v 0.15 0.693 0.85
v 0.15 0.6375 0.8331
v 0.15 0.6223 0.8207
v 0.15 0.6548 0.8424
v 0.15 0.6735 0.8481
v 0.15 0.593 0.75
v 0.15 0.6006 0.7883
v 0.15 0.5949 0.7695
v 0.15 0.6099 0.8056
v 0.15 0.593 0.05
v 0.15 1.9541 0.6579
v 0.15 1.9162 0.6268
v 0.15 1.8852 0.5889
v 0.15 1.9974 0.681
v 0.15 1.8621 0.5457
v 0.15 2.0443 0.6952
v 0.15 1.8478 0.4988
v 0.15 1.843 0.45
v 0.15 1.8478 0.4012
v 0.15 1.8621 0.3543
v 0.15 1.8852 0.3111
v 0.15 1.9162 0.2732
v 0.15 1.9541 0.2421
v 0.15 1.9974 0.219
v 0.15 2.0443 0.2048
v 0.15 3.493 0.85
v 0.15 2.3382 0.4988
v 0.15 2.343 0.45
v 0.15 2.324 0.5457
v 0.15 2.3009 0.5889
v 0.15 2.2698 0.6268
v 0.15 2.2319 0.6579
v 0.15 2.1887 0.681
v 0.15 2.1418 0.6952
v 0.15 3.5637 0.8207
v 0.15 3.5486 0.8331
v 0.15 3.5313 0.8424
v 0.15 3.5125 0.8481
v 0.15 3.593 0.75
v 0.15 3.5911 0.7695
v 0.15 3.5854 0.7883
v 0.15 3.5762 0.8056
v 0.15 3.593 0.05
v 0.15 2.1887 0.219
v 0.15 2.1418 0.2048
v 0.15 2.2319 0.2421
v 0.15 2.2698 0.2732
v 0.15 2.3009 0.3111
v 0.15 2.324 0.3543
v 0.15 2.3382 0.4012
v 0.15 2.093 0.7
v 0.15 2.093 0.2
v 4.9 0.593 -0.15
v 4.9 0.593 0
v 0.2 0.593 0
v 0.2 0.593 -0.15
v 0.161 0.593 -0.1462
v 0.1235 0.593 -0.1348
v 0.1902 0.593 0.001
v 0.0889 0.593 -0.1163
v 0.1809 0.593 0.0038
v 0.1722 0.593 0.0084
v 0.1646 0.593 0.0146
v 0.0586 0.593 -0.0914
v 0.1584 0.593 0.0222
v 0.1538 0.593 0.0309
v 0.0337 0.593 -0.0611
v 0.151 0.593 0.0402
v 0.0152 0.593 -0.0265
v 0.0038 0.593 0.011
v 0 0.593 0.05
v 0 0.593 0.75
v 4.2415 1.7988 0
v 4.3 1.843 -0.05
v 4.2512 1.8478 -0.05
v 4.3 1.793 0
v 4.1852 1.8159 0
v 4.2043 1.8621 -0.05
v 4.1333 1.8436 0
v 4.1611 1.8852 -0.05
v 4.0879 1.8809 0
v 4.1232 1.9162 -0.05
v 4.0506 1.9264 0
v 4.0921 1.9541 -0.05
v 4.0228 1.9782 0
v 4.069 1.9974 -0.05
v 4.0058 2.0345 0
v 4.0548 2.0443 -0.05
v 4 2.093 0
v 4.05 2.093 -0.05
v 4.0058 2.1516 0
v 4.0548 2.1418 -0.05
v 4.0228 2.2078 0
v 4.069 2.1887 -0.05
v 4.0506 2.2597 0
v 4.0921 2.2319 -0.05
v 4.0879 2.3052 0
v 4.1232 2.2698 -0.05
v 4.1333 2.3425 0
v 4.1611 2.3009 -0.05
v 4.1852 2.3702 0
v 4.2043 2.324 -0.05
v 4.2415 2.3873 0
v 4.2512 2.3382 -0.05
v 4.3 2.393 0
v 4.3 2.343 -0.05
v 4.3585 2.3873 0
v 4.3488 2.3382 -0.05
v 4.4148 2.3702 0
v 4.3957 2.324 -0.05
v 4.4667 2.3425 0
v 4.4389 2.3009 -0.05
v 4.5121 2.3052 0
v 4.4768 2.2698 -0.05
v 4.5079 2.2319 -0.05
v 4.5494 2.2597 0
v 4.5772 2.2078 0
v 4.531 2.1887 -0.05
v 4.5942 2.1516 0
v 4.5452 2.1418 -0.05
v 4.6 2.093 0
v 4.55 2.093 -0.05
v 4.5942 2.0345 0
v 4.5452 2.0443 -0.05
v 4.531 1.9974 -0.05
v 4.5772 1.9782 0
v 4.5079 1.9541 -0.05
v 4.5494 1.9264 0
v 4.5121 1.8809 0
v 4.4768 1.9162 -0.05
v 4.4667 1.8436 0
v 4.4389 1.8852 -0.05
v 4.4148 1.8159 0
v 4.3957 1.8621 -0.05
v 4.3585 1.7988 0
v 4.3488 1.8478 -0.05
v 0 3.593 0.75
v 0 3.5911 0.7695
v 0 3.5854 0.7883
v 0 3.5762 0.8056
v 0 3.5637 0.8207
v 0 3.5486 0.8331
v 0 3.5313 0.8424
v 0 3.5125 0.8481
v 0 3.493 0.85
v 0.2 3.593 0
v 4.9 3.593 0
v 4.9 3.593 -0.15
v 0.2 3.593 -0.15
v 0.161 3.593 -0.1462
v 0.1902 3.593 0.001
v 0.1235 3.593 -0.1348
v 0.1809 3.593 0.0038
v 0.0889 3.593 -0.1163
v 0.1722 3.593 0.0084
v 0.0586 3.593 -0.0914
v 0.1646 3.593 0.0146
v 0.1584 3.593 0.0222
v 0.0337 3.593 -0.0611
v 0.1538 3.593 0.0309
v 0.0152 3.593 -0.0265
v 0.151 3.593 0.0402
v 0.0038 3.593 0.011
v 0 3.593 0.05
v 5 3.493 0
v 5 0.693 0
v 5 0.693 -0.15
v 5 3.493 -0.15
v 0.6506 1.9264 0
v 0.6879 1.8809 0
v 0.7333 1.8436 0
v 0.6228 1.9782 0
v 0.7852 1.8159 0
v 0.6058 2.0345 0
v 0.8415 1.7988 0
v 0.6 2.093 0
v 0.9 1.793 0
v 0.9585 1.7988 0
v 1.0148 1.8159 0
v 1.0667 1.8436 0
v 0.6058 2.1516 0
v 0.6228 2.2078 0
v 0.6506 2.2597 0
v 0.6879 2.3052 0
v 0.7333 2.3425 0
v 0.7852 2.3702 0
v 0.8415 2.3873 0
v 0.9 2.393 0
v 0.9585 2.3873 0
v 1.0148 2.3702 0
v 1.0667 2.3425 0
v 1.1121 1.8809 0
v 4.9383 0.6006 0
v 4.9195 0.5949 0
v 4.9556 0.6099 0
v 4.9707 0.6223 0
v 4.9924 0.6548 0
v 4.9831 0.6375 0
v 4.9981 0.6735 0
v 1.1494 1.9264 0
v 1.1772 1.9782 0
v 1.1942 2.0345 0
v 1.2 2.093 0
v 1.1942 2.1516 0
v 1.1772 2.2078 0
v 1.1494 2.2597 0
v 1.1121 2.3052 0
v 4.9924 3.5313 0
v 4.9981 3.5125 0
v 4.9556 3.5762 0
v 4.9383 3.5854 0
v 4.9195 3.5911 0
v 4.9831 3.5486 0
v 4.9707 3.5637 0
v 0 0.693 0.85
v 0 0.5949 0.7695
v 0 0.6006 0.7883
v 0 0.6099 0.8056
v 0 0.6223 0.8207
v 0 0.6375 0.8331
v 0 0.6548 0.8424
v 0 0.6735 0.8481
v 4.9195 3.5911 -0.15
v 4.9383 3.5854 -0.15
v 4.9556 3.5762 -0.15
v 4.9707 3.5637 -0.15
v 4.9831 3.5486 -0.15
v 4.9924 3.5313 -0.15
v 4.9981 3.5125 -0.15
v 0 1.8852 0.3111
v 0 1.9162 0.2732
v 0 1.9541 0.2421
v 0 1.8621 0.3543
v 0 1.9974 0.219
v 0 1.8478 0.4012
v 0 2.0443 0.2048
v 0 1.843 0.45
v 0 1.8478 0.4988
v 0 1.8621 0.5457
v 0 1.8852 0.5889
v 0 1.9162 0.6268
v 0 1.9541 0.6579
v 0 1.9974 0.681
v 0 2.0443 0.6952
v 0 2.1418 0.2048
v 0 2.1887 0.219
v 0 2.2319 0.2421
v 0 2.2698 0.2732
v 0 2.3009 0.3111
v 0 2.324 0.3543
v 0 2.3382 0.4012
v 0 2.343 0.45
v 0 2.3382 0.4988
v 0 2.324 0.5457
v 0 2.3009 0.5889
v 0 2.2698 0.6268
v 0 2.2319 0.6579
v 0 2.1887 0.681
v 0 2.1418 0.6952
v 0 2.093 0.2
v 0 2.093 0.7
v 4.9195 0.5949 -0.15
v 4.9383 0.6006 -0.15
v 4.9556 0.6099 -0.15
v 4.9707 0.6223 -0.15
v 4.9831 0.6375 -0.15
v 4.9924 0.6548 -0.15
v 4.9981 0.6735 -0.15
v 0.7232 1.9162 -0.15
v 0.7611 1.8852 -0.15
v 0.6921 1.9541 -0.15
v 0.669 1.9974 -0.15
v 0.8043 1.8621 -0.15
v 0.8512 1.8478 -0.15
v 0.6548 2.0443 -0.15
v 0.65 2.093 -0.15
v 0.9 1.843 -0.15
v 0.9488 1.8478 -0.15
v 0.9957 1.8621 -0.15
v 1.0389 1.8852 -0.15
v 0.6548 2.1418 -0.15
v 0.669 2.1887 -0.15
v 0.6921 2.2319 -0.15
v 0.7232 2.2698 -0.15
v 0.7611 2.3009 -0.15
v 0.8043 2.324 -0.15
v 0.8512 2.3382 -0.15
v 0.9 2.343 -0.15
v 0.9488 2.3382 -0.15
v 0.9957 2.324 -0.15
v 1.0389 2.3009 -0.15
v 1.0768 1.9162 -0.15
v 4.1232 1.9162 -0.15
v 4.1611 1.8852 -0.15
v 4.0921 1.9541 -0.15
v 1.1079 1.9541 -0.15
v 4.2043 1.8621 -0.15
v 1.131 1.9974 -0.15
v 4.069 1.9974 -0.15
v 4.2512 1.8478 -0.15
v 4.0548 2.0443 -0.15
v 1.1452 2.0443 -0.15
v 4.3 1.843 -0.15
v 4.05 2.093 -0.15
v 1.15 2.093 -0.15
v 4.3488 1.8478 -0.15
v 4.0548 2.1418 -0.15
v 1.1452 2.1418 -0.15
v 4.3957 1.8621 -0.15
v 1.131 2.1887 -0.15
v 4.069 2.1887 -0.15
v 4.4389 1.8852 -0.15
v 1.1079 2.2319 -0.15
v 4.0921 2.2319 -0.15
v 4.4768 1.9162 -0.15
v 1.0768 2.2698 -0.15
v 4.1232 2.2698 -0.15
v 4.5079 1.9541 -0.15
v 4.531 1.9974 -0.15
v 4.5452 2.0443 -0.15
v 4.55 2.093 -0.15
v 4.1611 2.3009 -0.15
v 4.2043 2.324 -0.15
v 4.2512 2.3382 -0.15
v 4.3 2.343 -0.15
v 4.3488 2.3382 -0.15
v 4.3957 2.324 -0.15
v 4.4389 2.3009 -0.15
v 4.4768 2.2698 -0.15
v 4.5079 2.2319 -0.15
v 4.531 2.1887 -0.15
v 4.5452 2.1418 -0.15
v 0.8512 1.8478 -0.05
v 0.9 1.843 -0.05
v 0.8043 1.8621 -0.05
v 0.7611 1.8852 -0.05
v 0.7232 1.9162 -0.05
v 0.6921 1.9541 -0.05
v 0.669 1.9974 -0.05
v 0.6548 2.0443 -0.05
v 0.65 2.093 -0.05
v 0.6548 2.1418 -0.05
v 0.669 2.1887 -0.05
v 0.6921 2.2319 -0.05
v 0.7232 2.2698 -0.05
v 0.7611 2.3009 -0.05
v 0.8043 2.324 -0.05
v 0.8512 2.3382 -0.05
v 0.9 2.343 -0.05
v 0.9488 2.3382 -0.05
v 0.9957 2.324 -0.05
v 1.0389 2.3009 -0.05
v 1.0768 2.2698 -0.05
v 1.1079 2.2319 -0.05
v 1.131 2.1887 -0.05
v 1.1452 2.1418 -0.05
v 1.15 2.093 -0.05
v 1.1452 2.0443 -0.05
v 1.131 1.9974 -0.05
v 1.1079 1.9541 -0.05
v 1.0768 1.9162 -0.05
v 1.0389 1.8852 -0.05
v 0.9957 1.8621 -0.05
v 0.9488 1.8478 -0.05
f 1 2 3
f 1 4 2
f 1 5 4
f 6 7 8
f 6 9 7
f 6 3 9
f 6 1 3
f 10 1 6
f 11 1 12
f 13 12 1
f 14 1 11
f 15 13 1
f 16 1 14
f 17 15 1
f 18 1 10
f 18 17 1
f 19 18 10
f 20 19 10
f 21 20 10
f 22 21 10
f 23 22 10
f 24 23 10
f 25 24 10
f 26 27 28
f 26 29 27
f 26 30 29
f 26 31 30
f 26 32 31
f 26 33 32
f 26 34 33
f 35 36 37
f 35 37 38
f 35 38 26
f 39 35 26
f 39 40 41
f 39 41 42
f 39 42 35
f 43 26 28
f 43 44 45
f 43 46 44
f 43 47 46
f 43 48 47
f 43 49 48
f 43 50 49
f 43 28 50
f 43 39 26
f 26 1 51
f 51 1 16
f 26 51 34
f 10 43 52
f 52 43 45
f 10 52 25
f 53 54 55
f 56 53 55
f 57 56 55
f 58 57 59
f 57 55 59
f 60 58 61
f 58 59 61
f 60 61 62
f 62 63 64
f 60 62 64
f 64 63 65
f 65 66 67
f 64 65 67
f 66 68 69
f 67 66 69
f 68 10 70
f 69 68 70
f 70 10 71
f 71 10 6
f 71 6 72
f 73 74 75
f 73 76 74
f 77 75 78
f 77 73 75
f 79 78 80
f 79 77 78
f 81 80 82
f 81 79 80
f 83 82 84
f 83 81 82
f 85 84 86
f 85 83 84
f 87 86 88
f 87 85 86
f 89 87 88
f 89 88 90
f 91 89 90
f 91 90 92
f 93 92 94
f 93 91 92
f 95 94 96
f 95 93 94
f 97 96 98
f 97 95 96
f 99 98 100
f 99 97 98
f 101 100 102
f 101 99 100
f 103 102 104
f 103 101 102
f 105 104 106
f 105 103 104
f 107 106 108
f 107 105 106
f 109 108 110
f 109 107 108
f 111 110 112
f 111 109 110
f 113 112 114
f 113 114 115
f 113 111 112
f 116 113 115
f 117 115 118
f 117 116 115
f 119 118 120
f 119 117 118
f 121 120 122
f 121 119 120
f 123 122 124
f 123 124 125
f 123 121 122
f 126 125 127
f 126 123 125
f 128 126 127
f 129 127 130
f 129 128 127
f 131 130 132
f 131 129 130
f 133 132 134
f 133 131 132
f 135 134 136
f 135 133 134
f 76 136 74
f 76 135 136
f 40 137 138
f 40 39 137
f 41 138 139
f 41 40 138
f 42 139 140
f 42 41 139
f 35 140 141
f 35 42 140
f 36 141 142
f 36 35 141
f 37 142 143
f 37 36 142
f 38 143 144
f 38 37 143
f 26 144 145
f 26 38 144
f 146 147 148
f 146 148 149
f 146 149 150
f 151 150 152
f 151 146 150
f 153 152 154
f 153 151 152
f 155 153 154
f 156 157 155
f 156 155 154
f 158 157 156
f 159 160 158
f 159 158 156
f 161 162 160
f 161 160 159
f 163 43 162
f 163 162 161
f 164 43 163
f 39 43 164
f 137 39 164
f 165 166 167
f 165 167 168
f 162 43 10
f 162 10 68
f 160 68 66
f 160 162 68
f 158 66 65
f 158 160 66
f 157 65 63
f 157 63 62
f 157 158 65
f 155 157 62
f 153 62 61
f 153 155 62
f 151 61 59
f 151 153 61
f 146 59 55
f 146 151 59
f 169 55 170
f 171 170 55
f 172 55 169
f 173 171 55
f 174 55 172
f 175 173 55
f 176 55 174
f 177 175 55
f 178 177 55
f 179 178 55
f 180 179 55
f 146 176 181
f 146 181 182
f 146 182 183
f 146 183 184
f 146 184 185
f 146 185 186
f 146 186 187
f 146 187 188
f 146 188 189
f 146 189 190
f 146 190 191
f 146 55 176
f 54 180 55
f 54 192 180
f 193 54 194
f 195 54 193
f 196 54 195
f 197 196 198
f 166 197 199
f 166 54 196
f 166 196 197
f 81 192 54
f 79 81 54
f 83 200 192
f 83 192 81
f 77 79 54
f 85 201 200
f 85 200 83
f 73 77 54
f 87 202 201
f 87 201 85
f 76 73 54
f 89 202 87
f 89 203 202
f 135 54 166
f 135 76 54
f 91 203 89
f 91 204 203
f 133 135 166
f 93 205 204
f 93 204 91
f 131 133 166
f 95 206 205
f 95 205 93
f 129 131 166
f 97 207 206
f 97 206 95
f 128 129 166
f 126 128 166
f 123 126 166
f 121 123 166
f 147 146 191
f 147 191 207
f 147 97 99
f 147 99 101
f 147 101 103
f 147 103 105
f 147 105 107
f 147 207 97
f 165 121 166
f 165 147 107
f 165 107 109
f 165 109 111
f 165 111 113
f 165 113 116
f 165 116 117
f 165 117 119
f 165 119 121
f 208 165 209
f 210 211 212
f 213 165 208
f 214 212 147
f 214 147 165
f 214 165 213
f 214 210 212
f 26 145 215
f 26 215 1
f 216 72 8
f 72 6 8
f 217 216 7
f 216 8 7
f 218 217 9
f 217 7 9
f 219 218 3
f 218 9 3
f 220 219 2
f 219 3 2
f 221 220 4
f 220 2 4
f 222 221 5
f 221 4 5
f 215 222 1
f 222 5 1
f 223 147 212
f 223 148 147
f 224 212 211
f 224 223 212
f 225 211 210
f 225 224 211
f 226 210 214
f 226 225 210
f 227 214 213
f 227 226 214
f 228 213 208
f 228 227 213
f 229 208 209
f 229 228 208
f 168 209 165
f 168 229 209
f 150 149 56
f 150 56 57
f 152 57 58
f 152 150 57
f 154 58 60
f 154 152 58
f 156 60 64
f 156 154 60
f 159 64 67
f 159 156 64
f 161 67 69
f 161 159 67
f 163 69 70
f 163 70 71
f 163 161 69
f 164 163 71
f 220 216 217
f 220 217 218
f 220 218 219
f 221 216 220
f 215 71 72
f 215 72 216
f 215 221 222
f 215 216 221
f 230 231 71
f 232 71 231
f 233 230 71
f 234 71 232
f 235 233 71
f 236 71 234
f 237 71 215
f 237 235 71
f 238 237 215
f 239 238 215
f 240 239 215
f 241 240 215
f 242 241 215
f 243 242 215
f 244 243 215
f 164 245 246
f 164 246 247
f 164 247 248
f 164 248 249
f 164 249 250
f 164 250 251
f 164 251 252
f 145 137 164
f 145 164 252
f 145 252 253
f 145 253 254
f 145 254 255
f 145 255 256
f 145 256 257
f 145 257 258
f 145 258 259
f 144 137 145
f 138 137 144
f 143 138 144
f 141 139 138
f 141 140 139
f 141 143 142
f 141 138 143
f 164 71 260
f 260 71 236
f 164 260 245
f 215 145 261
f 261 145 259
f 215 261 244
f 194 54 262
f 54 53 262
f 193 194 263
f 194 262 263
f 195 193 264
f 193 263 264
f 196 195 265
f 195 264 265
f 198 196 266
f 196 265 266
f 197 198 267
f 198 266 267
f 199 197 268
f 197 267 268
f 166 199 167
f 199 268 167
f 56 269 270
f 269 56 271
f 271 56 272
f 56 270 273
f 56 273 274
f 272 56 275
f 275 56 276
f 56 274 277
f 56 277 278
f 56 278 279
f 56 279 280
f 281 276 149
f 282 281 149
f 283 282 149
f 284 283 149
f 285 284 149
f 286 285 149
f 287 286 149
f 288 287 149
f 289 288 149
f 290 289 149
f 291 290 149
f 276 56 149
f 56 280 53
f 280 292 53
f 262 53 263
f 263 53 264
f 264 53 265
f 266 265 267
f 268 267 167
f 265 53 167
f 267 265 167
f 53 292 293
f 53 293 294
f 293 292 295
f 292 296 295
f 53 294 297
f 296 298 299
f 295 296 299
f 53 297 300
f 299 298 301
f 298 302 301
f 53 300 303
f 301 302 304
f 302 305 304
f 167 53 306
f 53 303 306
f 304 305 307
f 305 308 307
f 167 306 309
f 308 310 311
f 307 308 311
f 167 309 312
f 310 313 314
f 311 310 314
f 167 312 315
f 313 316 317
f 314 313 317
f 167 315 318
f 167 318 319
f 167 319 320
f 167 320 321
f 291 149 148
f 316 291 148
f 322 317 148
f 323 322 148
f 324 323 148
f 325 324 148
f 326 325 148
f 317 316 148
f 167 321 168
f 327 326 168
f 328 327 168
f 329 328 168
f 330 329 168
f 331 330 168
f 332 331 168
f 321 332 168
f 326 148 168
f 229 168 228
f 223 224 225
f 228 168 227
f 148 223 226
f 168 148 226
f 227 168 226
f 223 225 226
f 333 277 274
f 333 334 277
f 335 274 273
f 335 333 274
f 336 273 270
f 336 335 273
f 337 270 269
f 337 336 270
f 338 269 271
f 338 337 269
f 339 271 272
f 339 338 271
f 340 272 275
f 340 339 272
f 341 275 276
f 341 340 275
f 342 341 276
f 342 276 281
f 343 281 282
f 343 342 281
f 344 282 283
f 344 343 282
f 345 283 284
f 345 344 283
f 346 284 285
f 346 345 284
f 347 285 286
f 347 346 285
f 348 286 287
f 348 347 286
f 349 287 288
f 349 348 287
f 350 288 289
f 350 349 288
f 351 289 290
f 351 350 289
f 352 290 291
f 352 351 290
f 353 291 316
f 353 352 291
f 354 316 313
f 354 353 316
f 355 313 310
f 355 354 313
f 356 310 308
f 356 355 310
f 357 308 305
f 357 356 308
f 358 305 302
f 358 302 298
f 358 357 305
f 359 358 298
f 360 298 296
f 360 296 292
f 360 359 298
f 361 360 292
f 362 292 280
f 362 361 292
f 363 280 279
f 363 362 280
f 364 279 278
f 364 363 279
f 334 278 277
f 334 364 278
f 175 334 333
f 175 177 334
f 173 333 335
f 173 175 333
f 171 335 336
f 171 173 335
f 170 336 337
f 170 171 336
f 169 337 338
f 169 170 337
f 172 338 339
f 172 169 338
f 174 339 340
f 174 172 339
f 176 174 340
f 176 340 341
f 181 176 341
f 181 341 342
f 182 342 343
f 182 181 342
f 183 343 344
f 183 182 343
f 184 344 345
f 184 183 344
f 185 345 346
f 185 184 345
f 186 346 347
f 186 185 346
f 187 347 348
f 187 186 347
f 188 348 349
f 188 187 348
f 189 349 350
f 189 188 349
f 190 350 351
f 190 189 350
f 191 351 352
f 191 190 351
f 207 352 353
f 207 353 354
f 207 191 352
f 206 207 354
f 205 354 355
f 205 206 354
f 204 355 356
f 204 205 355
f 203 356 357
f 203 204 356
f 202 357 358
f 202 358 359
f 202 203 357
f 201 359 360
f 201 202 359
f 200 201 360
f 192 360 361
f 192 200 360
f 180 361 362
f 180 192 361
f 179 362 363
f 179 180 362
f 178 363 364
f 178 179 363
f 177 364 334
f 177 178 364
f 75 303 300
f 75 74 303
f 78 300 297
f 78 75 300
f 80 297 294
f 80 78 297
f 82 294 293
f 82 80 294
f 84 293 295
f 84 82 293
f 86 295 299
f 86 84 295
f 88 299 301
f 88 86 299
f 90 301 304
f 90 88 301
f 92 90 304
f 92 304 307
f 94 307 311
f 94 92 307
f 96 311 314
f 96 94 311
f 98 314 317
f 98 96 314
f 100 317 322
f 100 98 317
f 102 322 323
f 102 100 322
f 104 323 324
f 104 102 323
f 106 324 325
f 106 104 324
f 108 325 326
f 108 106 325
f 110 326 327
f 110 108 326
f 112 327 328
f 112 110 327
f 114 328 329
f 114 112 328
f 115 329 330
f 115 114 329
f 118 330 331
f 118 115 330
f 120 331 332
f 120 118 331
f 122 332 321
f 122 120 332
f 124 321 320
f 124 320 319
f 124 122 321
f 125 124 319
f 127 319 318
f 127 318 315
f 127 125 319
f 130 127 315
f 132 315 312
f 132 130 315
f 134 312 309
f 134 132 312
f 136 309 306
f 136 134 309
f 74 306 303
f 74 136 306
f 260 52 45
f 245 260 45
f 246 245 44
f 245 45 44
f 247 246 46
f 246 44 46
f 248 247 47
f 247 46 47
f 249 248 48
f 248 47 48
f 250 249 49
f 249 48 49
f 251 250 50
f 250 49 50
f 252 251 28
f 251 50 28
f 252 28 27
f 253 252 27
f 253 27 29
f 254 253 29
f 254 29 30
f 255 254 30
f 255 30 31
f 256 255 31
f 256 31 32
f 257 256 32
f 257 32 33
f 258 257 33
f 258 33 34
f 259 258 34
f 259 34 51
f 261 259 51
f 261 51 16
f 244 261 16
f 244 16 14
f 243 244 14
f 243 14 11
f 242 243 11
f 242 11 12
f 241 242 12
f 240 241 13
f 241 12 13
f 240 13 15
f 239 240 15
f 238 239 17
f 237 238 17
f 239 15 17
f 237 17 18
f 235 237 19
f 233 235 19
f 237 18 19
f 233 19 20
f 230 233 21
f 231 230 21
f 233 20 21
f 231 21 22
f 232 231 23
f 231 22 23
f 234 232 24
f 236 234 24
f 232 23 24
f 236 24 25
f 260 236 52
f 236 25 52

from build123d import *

# Parameters (mm, degrees)
SKETCH2_W                                      = 5
SKETCH2_H                                      = 3
BASE_FLANGE1_DEPTH                             = 0.15
EDGE_FLANGE1_STRIP_W                           = 0.7
EDGE_FLANGE1_STRIP_H                           = 0.15
EDGE_FLANGE1_STRIP_CUT_DEPTH                   = 3
EDGE_FLANGE1_DEPTH                             = 3
SKETCH14_R                                     = 0.25
CUT_EXTRUDE1_DEPTH                             = 7.095475053
CSK_FOR_M2_FLAT_HEAD_MACHINE_SCREW1_AT_2_COUNT = 2
CSK_FOR_M2_FLAT_HEAD_MACHINE_SCREW1_AT_2_PITCH = 3.4
FILLET1_R                                      = 0.1


# Sheet-metal steps are written as plain solids
with BuildPart() as part:
    # Sketch2 → Base-Flange1 (new body)
    with BuildSketch(Plane.XY):
        with Locations((2.5, 2.093023256)):
            Rectangle(SKETCH2_W, SKETCH2_H)
    extrude(amount=-BASE_FLANGE1_DEPTH)

    # Edge-Flange1 strip (across the edge) → Edge-Flange1 strip cut (cut)
    with BuildSketch(Plane.XZ.offset(-3.593023256)):
        with Locations((-0.15, -0.075)):
            Rectangle(EDGE_FLANGE1_STRIP_W, EDGE_FLANGE1_STRIP_H)
    extrude(amount=EDGE_FLANGE1_STRIP_CUT_DEPTH, mode=Mode.SUBTRACT)

    # Edge-Flange1 section (across the edge) → Edge-Flange1 (add)
    with BuildSketch(Plane.XZ.offset(-3.593023256)):
        with BuildLine():
            Line((0, 0.05), (0, 0.85))
            Line((0, 0.85), (0.15, 0.85))
            Line((0.15, 0.85), (0.15, 0.05))
            ThreePointArc((0.15, 0.05), (0.164644661, 0.014644661), (0.2, 0))
            Line((0.2, 0), (0.2, -0.15))
            ThreePointArc((0.2, -0.15), (0.058578644, -0.091421356), (0, 0.05))
        make_face()
    extrude(amount=EDGE_FLANGE1_DEPTH)

    # Sketch14 → Cut-Extrude1 (cut, through all)
    with BuildSketch(Plane(origin=(0.15, 0, 0), x_dir=(0, 0, -1), z_dir=(1, 0, 0))):
        with Locations((-0.45, 2.093023256)):
            Circle(SKETCH14_R)
    extrude(amount=-CUT_EXTRUDE1_DEPTH, mode=Mode.SUBTRACT)

    # Sketch17 → CSK for M2 Flat Head Machine Screw1 (revolve, cut)
    with BuildSketch(Plane(origin=(0.9, 2.093023256, 0), x_dir=(0, -1, 0), z_dir=(1, 0, 0))):
        Polygon((0, 0), (0, 0.15), (0.25, 0.15), (0.25, 0.05), (0.3, 0), align=None)
    csk_for_m2_flat_head_machine_screw1 = revolve(axis=Axis((0.9, 2.093023256, 6.35), (0, 0, -1)), mode=Mode.SUBTRACT)

    # CSK for M2 Flat Head Machine Screw1 at 2: CSK for M2 Flat Head Machine Screw1 ×2
    with Locations(*[(i * CSK_FOR_M2_FLAT_HEAD_MACHINE_SCREW1_AT_2_PITCH, 0, 0) for i in range(1, CSK_FOR_M2_FLAT_HEAD_MACHINE_SCREW1_AT_2_COUNT)]):
        add(csk_for_m2_flat_head_machine_screw1, mode=Mode.SUBTRACT)

    # Fillet1
    fillet1_edges = [part.edges().sort_by_distance(p)[0] for p in [
        (0.075, 3.593023256, 0.85),
        (0.075, 0.593023256, 0.85),
        (5, 3.593023256, -0.075),
        (5, 0.593023256, -0.075),
    ]]
    fillet(fillet1_edges, radius=FILLET1_R)


solid = part.part
